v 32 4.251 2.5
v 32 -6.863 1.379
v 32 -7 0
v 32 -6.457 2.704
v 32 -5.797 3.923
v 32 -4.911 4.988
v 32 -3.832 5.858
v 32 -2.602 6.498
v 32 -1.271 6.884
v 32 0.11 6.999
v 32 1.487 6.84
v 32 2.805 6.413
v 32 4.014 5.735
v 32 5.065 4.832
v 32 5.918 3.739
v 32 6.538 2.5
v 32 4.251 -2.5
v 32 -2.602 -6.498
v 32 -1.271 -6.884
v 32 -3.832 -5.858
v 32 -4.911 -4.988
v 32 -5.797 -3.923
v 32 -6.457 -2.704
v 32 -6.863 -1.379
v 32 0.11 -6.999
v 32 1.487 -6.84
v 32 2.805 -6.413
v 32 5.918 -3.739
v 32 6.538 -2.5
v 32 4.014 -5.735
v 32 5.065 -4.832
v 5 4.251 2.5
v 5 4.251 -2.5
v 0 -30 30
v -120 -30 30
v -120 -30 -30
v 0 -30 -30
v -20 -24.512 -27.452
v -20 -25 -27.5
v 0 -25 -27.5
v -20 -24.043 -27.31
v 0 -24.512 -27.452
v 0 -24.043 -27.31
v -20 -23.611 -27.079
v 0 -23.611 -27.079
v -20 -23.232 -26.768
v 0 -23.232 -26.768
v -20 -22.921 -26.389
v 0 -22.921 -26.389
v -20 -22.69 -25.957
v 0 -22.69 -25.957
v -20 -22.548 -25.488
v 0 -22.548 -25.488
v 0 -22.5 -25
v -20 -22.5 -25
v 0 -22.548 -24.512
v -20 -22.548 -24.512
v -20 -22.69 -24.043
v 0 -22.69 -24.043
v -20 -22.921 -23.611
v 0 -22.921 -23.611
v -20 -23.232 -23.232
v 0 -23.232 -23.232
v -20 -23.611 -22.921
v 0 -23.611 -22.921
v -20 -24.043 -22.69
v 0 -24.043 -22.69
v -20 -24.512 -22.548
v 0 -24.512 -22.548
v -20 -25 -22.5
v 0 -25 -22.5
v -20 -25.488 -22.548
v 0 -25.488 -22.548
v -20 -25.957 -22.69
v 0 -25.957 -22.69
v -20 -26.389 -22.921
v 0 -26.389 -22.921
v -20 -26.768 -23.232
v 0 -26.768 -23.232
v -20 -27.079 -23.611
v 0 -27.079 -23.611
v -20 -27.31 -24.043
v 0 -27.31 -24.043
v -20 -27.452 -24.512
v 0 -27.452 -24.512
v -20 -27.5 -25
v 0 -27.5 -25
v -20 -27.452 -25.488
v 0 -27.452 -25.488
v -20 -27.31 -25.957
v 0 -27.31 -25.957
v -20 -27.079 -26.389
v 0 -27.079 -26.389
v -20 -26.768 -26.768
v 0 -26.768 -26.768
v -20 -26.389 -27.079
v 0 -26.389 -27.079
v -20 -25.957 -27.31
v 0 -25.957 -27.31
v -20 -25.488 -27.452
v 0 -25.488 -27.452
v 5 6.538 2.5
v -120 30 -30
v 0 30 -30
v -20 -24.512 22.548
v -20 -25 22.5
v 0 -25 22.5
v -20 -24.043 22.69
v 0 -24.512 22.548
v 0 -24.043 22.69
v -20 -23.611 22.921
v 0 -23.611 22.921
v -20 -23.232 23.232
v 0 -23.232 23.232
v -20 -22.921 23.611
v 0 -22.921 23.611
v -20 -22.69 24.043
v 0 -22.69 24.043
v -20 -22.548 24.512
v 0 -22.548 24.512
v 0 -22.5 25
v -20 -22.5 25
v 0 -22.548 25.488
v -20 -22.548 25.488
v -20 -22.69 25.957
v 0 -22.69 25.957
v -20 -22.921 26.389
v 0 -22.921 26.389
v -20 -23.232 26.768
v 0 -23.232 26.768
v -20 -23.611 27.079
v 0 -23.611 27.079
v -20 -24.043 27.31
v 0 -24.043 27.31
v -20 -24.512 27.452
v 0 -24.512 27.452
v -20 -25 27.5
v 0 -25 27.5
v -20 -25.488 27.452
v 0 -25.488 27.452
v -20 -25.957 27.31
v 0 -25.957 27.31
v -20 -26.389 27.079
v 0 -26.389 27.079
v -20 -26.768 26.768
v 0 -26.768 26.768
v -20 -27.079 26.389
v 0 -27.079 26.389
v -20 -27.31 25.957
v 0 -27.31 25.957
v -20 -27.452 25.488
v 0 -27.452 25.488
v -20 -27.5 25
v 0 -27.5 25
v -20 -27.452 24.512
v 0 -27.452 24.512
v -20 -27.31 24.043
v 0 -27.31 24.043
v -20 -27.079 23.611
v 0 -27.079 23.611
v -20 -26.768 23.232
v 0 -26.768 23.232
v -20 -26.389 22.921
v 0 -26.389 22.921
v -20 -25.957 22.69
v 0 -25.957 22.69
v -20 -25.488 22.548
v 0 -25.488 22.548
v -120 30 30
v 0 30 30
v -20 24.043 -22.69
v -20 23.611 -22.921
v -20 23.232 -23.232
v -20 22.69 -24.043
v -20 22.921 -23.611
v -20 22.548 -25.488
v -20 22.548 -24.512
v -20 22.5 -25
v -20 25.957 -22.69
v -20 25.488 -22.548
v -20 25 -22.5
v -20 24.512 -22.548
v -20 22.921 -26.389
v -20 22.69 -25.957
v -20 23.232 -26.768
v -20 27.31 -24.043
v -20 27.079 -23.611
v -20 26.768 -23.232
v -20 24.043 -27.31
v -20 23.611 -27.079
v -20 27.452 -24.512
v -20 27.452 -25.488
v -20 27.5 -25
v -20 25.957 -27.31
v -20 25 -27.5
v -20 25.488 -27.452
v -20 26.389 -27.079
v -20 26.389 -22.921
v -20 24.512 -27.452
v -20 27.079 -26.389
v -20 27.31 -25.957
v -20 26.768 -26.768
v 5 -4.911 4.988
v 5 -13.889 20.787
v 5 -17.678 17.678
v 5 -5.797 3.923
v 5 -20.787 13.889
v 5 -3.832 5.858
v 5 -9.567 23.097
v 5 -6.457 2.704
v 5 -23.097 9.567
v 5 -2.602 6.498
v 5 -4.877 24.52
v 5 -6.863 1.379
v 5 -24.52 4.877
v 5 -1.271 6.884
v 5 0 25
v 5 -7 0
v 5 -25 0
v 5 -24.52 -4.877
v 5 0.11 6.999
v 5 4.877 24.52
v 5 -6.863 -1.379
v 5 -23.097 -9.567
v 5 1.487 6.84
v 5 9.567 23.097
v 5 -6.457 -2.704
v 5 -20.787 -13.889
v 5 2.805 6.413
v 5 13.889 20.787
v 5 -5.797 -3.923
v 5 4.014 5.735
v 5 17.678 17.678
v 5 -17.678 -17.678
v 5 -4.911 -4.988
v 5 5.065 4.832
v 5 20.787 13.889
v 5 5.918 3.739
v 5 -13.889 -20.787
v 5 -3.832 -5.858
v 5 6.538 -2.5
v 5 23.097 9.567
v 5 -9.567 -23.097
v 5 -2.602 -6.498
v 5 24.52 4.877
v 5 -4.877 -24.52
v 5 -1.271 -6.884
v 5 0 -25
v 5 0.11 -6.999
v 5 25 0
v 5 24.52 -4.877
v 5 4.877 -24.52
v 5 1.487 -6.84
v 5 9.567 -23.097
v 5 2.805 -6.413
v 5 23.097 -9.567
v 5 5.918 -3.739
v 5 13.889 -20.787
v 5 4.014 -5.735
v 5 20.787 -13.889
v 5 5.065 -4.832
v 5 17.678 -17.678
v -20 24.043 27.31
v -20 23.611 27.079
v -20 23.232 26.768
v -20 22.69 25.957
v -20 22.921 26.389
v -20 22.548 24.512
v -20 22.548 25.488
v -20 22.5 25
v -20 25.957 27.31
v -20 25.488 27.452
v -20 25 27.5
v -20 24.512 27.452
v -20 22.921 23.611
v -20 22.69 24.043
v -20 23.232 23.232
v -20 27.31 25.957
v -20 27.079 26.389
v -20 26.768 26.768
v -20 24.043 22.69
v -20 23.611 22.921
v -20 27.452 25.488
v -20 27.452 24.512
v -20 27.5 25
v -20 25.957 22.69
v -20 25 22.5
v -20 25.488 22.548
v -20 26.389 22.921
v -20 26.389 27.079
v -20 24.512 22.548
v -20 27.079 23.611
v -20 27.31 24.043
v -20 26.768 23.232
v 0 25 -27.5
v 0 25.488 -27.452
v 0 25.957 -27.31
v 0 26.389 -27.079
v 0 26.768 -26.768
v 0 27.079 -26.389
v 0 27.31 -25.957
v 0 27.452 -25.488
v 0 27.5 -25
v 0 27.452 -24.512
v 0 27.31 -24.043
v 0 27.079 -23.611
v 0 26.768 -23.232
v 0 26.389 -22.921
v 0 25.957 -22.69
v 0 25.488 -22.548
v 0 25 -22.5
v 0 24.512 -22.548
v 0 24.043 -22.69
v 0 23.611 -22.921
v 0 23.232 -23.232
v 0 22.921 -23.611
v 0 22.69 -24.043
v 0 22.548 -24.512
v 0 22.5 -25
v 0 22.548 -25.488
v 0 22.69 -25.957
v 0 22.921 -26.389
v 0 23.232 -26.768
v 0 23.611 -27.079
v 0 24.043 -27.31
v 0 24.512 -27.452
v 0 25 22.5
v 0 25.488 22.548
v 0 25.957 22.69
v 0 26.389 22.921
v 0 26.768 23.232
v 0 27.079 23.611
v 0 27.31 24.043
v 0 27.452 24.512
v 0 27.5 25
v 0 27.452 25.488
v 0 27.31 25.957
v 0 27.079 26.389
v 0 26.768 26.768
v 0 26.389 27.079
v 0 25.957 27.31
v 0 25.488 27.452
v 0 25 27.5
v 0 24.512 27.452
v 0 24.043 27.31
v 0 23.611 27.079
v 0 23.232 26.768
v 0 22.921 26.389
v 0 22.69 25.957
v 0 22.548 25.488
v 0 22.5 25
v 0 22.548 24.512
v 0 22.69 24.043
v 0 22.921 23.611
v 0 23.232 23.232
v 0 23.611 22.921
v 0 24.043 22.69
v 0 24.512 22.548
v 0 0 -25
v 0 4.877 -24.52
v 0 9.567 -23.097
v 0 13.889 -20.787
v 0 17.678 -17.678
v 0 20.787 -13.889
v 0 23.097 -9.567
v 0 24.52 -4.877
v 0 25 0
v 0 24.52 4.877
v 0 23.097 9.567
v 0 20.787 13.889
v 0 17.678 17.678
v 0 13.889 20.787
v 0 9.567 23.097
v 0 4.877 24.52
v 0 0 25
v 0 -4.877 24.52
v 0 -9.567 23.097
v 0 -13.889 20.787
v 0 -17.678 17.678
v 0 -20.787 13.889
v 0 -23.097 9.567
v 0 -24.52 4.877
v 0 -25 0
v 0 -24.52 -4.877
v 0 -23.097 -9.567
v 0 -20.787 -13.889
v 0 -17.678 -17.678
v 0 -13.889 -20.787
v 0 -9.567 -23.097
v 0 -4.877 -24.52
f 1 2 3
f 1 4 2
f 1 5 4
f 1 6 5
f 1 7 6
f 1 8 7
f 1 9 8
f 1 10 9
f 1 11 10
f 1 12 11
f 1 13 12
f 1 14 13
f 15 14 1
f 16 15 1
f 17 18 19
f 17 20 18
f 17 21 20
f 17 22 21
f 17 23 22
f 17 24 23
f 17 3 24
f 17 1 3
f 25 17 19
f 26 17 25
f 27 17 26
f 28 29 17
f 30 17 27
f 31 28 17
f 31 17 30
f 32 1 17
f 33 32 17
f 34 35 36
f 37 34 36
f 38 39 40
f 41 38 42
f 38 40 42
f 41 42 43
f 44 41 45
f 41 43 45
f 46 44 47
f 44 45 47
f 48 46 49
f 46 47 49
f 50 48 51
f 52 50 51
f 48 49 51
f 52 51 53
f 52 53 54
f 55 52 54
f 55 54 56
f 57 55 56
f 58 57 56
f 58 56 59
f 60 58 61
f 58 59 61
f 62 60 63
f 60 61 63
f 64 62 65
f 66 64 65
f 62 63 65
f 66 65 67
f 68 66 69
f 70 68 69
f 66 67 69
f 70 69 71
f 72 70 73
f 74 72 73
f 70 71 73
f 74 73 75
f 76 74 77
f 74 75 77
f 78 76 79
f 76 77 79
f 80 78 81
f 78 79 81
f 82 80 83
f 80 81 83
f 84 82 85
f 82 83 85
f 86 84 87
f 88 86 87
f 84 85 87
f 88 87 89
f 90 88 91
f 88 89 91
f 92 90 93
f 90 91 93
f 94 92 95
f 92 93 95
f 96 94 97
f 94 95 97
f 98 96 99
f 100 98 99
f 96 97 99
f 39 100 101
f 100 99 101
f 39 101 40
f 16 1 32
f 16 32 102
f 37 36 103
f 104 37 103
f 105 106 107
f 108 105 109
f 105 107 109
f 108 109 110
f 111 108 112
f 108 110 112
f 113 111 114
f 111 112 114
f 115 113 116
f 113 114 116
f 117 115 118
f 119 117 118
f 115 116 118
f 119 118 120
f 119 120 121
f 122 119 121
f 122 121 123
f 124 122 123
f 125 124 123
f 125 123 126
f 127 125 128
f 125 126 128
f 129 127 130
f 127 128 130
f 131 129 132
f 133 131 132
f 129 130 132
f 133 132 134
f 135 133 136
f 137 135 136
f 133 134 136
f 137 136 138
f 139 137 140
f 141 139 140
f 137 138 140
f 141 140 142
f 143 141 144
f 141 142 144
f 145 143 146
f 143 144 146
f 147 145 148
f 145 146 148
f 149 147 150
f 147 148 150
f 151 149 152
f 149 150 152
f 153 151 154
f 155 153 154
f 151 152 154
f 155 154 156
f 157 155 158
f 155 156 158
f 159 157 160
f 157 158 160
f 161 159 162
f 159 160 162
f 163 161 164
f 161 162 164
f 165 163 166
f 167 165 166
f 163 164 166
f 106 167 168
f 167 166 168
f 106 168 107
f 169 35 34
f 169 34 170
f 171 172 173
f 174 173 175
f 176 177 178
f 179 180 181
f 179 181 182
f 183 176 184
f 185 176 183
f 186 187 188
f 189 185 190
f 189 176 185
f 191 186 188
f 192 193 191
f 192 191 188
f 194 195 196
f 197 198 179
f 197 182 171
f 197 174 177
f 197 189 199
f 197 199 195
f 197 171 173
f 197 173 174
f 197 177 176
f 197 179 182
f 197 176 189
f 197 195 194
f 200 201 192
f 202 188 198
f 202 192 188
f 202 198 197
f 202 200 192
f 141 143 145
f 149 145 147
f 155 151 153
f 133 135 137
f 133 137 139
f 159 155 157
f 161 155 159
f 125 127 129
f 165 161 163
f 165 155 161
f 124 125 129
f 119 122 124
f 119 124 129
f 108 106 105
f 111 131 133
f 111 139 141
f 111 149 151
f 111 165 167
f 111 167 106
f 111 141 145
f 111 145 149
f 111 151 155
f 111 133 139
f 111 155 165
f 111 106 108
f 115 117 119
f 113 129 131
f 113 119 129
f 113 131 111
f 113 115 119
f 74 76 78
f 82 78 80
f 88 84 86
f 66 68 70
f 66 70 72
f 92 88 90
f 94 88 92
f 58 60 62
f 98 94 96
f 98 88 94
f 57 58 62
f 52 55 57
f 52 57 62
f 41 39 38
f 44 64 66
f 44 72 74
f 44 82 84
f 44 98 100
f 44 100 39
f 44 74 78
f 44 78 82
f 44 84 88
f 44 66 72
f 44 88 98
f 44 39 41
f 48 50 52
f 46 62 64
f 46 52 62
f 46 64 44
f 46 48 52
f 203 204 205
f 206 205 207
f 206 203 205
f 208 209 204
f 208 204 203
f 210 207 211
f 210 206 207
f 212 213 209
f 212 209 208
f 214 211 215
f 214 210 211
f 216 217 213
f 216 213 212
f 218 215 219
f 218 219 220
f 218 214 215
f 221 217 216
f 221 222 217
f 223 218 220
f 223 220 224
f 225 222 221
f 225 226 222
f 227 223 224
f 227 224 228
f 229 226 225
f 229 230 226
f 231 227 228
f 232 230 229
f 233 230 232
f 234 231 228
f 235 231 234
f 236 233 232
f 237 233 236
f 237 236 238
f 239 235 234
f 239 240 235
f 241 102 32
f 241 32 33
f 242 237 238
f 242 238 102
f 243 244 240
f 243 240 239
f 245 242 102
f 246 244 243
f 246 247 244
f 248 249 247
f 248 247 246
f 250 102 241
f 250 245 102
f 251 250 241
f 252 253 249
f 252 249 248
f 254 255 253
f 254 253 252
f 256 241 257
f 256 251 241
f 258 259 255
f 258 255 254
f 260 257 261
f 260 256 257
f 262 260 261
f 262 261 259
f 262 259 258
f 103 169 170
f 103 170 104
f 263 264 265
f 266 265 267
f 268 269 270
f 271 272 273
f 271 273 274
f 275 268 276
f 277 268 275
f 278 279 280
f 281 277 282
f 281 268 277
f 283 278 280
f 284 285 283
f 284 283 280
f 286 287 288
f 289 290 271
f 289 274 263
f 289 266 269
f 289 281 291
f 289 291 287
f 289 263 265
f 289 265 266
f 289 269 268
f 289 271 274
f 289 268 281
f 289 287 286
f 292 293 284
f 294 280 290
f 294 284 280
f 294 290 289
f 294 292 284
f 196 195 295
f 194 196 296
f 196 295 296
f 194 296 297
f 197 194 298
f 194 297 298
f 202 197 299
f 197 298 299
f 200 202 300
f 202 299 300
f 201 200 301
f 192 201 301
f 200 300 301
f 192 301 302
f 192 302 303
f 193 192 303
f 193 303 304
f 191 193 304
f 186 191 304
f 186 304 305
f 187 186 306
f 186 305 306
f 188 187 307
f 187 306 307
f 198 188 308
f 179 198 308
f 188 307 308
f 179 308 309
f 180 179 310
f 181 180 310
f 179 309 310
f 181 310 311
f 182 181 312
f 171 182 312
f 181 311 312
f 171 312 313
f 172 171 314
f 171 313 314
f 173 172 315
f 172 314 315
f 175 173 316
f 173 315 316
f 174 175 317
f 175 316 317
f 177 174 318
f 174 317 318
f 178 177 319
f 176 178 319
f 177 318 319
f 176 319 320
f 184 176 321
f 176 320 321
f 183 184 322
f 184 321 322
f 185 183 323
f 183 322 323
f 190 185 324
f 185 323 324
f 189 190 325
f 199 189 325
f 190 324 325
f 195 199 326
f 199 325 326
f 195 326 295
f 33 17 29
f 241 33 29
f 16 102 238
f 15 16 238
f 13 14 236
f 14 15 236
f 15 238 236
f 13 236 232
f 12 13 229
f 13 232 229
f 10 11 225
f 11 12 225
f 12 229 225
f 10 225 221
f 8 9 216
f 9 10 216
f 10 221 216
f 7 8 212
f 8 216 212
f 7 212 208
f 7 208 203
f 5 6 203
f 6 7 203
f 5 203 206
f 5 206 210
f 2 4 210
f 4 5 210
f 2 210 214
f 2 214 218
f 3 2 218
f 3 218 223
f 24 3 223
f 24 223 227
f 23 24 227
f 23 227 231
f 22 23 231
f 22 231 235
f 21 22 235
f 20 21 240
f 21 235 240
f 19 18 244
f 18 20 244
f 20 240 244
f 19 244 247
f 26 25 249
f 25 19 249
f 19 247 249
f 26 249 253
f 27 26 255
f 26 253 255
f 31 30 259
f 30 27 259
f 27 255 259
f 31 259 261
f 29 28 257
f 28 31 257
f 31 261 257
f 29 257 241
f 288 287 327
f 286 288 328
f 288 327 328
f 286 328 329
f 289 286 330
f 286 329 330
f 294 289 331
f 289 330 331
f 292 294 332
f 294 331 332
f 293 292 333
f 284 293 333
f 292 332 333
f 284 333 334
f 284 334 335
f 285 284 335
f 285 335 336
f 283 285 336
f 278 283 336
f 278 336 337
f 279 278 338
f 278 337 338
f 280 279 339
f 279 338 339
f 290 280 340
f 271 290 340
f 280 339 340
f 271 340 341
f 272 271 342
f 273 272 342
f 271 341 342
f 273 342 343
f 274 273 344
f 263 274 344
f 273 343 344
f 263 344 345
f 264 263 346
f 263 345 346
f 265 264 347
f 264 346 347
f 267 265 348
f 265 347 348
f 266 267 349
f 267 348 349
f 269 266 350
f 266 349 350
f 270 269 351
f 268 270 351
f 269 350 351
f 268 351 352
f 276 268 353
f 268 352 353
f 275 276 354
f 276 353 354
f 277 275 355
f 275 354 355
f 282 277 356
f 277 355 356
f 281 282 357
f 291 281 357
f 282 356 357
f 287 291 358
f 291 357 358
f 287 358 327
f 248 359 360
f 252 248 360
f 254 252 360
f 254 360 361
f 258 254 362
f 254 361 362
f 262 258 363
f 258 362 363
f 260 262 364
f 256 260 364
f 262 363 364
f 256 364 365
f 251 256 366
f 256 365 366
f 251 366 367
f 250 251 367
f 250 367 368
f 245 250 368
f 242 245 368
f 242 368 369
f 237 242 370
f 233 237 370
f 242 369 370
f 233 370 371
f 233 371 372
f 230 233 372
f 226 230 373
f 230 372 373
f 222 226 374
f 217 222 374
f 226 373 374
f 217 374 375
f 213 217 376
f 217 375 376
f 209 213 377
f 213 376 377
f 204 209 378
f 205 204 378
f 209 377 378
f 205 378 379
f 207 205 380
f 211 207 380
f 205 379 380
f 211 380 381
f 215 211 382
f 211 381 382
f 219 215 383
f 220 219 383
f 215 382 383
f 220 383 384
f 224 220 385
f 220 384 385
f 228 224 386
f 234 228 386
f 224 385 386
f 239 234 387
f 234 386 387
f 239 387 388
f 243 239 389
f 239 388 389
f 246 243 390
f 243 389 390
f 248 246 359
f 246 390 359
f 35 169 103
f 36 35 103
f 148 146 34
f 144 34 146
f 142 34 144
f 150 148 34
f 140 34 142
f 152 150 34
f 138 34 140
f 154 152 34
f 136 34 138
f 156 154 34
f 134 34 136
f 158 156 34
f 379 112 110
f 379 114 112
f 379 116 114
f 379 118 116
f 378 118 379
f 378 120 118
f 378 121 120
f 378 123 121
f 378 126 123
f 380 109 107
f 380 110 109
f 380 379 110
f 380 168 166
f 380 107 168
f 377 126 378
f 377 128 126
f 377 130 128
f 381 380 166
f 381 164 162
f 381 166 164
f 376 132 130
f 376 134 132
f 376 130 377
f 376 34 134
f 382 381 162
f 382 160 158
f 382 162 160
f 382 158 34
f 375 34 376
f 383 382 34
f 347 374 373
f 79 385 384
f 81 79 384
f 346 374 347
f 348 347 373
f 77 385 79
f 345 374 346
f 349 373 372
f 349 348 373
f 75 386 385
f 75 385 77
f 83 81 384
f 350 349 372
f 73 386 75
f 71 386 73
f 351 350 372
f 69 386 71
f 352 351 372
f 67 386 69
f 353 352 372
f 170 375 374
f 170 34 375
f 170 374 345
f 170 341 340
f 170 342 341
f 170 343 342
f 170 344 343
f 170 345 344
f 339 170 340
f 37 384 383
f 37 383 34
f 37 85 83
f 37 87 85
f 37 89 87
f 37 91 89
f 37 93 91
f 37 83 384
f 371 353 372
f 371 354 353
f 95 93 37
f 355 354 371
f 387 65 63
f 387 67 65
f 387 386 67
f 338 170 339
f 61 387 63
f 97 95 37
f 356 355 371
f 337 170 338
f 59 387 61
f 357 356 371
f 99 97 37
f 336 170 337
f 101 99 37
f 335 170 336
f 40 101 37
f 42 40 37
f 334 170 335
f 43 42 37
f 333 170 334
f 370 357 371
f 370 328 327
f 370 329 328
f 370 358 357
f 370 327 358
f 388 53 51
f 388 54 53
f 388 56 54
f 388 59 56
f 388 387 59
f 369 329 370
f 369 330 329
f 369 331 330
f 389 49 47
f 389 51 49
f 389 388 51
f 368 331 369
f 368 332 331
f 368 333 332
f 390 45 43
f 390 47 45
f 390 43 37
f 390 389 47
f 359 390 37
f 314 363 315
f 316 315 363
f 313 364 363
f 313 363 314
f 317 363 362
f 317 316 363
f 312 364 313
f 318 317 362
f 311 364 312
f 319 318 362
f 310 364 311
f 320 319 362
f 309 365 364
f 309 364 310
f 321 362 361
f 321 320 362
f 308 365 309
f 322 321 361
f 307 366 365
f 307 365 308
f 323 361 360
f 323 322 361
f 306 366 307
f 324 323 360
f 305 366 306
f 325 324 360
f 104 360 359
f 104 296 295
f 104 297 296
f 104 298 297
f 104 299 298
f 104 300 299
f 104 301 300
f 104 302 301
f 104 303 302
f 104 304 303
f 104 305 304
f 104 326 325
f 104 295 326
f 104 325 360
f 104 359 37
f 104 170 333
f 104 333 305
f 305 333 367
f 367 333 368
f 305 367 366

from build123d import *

# Parameters (mm, degrees)
SKETCH_1_W          = 60
SKETCH_1_H          = 60
EXTRUDE_1_DEPTH     = 120
SKETCH_2_R          = 2.5
CUT_EXTRUDE_1_DEPTH = 20
SKETCH_3_R          = 25
EXTRUDE_2_DEPTH     = 5
SKETCH_4_R          = 7
EXTRUDE_3_DEPTH     = 27
SKETCH_5_W          = 5
SKETCH_5_H          = 2.748835856
CUT_EXTRUDE_2_DEPTH = 27


with BuildPart() as part:
    # 草图1 → 凸台-拉伸1 (new body)
    with BuildSketch(Plane(origin=(0, 0, 0), x_dir=(0, 0, -1), z_dir=(1, 0, 0))):
        Rectangle(SKETCH_1_W, SKETCH_1_H)
    extrude(amount=-EXTRUDE_1_DEPTH)

    # 草图2 → 切除-拉伸1 (cut)
    with BuildSketch(Plane(origin=(0, 0, 0), x_dir=(0, 0, -1), z_dir=(1, 0, 0))):
        with Locations((-25, 25)):
            Circle(SKETCH_2_R)
        with Locations((25, 25)):
            Circle(SKETCH_2_R)
        with Locations((-25, -25)):
            Circle(SKETCH_2_R)
        with Locations((25, -25)):
            Circle(SKETCH_2_R)
    extrude(amount=-CUT_EXTRUDE_1_DEPTH, mode=Mode.SUBTRACT)

    # 草图3 → 凸台-拉伸2 (add)
    with BuildSketch(Plane(origin=(0, 0, 0), x_dir=(0, 0, -1), z_dir=(1, 0, 0))):
        Circle(SKETCH_3_R)
    extrude(amount=EXTRUDE_2_DEPTH)

    # 草图4 → 凸台-拉伸3 (add)
    with BuildSketch(Plane(origin=(5, 0, 0), x_dir=(0, 0, -1), z_dir=(1, 0, 0))):
        Circle(SKETCH_4_R)
    extrude(amount=EXTRUDE_3_DEPTH)

    # 草图5 → 切除-拉伸2 (cut)
    with BuildSketch(Plane(origin=(32, 0, 0), x_dir=(0, 0, -1), z_dir=(1, 0, 0))):
        with Locations((0, 5.625582072)):
            Rectangle(SKETCH_5_W, SKETCH_5_H)
    extrude(amount=-CUT_EXTRUDE_2_DEPTH, mode=Mode.SUBTRACT)


solid = part.part
